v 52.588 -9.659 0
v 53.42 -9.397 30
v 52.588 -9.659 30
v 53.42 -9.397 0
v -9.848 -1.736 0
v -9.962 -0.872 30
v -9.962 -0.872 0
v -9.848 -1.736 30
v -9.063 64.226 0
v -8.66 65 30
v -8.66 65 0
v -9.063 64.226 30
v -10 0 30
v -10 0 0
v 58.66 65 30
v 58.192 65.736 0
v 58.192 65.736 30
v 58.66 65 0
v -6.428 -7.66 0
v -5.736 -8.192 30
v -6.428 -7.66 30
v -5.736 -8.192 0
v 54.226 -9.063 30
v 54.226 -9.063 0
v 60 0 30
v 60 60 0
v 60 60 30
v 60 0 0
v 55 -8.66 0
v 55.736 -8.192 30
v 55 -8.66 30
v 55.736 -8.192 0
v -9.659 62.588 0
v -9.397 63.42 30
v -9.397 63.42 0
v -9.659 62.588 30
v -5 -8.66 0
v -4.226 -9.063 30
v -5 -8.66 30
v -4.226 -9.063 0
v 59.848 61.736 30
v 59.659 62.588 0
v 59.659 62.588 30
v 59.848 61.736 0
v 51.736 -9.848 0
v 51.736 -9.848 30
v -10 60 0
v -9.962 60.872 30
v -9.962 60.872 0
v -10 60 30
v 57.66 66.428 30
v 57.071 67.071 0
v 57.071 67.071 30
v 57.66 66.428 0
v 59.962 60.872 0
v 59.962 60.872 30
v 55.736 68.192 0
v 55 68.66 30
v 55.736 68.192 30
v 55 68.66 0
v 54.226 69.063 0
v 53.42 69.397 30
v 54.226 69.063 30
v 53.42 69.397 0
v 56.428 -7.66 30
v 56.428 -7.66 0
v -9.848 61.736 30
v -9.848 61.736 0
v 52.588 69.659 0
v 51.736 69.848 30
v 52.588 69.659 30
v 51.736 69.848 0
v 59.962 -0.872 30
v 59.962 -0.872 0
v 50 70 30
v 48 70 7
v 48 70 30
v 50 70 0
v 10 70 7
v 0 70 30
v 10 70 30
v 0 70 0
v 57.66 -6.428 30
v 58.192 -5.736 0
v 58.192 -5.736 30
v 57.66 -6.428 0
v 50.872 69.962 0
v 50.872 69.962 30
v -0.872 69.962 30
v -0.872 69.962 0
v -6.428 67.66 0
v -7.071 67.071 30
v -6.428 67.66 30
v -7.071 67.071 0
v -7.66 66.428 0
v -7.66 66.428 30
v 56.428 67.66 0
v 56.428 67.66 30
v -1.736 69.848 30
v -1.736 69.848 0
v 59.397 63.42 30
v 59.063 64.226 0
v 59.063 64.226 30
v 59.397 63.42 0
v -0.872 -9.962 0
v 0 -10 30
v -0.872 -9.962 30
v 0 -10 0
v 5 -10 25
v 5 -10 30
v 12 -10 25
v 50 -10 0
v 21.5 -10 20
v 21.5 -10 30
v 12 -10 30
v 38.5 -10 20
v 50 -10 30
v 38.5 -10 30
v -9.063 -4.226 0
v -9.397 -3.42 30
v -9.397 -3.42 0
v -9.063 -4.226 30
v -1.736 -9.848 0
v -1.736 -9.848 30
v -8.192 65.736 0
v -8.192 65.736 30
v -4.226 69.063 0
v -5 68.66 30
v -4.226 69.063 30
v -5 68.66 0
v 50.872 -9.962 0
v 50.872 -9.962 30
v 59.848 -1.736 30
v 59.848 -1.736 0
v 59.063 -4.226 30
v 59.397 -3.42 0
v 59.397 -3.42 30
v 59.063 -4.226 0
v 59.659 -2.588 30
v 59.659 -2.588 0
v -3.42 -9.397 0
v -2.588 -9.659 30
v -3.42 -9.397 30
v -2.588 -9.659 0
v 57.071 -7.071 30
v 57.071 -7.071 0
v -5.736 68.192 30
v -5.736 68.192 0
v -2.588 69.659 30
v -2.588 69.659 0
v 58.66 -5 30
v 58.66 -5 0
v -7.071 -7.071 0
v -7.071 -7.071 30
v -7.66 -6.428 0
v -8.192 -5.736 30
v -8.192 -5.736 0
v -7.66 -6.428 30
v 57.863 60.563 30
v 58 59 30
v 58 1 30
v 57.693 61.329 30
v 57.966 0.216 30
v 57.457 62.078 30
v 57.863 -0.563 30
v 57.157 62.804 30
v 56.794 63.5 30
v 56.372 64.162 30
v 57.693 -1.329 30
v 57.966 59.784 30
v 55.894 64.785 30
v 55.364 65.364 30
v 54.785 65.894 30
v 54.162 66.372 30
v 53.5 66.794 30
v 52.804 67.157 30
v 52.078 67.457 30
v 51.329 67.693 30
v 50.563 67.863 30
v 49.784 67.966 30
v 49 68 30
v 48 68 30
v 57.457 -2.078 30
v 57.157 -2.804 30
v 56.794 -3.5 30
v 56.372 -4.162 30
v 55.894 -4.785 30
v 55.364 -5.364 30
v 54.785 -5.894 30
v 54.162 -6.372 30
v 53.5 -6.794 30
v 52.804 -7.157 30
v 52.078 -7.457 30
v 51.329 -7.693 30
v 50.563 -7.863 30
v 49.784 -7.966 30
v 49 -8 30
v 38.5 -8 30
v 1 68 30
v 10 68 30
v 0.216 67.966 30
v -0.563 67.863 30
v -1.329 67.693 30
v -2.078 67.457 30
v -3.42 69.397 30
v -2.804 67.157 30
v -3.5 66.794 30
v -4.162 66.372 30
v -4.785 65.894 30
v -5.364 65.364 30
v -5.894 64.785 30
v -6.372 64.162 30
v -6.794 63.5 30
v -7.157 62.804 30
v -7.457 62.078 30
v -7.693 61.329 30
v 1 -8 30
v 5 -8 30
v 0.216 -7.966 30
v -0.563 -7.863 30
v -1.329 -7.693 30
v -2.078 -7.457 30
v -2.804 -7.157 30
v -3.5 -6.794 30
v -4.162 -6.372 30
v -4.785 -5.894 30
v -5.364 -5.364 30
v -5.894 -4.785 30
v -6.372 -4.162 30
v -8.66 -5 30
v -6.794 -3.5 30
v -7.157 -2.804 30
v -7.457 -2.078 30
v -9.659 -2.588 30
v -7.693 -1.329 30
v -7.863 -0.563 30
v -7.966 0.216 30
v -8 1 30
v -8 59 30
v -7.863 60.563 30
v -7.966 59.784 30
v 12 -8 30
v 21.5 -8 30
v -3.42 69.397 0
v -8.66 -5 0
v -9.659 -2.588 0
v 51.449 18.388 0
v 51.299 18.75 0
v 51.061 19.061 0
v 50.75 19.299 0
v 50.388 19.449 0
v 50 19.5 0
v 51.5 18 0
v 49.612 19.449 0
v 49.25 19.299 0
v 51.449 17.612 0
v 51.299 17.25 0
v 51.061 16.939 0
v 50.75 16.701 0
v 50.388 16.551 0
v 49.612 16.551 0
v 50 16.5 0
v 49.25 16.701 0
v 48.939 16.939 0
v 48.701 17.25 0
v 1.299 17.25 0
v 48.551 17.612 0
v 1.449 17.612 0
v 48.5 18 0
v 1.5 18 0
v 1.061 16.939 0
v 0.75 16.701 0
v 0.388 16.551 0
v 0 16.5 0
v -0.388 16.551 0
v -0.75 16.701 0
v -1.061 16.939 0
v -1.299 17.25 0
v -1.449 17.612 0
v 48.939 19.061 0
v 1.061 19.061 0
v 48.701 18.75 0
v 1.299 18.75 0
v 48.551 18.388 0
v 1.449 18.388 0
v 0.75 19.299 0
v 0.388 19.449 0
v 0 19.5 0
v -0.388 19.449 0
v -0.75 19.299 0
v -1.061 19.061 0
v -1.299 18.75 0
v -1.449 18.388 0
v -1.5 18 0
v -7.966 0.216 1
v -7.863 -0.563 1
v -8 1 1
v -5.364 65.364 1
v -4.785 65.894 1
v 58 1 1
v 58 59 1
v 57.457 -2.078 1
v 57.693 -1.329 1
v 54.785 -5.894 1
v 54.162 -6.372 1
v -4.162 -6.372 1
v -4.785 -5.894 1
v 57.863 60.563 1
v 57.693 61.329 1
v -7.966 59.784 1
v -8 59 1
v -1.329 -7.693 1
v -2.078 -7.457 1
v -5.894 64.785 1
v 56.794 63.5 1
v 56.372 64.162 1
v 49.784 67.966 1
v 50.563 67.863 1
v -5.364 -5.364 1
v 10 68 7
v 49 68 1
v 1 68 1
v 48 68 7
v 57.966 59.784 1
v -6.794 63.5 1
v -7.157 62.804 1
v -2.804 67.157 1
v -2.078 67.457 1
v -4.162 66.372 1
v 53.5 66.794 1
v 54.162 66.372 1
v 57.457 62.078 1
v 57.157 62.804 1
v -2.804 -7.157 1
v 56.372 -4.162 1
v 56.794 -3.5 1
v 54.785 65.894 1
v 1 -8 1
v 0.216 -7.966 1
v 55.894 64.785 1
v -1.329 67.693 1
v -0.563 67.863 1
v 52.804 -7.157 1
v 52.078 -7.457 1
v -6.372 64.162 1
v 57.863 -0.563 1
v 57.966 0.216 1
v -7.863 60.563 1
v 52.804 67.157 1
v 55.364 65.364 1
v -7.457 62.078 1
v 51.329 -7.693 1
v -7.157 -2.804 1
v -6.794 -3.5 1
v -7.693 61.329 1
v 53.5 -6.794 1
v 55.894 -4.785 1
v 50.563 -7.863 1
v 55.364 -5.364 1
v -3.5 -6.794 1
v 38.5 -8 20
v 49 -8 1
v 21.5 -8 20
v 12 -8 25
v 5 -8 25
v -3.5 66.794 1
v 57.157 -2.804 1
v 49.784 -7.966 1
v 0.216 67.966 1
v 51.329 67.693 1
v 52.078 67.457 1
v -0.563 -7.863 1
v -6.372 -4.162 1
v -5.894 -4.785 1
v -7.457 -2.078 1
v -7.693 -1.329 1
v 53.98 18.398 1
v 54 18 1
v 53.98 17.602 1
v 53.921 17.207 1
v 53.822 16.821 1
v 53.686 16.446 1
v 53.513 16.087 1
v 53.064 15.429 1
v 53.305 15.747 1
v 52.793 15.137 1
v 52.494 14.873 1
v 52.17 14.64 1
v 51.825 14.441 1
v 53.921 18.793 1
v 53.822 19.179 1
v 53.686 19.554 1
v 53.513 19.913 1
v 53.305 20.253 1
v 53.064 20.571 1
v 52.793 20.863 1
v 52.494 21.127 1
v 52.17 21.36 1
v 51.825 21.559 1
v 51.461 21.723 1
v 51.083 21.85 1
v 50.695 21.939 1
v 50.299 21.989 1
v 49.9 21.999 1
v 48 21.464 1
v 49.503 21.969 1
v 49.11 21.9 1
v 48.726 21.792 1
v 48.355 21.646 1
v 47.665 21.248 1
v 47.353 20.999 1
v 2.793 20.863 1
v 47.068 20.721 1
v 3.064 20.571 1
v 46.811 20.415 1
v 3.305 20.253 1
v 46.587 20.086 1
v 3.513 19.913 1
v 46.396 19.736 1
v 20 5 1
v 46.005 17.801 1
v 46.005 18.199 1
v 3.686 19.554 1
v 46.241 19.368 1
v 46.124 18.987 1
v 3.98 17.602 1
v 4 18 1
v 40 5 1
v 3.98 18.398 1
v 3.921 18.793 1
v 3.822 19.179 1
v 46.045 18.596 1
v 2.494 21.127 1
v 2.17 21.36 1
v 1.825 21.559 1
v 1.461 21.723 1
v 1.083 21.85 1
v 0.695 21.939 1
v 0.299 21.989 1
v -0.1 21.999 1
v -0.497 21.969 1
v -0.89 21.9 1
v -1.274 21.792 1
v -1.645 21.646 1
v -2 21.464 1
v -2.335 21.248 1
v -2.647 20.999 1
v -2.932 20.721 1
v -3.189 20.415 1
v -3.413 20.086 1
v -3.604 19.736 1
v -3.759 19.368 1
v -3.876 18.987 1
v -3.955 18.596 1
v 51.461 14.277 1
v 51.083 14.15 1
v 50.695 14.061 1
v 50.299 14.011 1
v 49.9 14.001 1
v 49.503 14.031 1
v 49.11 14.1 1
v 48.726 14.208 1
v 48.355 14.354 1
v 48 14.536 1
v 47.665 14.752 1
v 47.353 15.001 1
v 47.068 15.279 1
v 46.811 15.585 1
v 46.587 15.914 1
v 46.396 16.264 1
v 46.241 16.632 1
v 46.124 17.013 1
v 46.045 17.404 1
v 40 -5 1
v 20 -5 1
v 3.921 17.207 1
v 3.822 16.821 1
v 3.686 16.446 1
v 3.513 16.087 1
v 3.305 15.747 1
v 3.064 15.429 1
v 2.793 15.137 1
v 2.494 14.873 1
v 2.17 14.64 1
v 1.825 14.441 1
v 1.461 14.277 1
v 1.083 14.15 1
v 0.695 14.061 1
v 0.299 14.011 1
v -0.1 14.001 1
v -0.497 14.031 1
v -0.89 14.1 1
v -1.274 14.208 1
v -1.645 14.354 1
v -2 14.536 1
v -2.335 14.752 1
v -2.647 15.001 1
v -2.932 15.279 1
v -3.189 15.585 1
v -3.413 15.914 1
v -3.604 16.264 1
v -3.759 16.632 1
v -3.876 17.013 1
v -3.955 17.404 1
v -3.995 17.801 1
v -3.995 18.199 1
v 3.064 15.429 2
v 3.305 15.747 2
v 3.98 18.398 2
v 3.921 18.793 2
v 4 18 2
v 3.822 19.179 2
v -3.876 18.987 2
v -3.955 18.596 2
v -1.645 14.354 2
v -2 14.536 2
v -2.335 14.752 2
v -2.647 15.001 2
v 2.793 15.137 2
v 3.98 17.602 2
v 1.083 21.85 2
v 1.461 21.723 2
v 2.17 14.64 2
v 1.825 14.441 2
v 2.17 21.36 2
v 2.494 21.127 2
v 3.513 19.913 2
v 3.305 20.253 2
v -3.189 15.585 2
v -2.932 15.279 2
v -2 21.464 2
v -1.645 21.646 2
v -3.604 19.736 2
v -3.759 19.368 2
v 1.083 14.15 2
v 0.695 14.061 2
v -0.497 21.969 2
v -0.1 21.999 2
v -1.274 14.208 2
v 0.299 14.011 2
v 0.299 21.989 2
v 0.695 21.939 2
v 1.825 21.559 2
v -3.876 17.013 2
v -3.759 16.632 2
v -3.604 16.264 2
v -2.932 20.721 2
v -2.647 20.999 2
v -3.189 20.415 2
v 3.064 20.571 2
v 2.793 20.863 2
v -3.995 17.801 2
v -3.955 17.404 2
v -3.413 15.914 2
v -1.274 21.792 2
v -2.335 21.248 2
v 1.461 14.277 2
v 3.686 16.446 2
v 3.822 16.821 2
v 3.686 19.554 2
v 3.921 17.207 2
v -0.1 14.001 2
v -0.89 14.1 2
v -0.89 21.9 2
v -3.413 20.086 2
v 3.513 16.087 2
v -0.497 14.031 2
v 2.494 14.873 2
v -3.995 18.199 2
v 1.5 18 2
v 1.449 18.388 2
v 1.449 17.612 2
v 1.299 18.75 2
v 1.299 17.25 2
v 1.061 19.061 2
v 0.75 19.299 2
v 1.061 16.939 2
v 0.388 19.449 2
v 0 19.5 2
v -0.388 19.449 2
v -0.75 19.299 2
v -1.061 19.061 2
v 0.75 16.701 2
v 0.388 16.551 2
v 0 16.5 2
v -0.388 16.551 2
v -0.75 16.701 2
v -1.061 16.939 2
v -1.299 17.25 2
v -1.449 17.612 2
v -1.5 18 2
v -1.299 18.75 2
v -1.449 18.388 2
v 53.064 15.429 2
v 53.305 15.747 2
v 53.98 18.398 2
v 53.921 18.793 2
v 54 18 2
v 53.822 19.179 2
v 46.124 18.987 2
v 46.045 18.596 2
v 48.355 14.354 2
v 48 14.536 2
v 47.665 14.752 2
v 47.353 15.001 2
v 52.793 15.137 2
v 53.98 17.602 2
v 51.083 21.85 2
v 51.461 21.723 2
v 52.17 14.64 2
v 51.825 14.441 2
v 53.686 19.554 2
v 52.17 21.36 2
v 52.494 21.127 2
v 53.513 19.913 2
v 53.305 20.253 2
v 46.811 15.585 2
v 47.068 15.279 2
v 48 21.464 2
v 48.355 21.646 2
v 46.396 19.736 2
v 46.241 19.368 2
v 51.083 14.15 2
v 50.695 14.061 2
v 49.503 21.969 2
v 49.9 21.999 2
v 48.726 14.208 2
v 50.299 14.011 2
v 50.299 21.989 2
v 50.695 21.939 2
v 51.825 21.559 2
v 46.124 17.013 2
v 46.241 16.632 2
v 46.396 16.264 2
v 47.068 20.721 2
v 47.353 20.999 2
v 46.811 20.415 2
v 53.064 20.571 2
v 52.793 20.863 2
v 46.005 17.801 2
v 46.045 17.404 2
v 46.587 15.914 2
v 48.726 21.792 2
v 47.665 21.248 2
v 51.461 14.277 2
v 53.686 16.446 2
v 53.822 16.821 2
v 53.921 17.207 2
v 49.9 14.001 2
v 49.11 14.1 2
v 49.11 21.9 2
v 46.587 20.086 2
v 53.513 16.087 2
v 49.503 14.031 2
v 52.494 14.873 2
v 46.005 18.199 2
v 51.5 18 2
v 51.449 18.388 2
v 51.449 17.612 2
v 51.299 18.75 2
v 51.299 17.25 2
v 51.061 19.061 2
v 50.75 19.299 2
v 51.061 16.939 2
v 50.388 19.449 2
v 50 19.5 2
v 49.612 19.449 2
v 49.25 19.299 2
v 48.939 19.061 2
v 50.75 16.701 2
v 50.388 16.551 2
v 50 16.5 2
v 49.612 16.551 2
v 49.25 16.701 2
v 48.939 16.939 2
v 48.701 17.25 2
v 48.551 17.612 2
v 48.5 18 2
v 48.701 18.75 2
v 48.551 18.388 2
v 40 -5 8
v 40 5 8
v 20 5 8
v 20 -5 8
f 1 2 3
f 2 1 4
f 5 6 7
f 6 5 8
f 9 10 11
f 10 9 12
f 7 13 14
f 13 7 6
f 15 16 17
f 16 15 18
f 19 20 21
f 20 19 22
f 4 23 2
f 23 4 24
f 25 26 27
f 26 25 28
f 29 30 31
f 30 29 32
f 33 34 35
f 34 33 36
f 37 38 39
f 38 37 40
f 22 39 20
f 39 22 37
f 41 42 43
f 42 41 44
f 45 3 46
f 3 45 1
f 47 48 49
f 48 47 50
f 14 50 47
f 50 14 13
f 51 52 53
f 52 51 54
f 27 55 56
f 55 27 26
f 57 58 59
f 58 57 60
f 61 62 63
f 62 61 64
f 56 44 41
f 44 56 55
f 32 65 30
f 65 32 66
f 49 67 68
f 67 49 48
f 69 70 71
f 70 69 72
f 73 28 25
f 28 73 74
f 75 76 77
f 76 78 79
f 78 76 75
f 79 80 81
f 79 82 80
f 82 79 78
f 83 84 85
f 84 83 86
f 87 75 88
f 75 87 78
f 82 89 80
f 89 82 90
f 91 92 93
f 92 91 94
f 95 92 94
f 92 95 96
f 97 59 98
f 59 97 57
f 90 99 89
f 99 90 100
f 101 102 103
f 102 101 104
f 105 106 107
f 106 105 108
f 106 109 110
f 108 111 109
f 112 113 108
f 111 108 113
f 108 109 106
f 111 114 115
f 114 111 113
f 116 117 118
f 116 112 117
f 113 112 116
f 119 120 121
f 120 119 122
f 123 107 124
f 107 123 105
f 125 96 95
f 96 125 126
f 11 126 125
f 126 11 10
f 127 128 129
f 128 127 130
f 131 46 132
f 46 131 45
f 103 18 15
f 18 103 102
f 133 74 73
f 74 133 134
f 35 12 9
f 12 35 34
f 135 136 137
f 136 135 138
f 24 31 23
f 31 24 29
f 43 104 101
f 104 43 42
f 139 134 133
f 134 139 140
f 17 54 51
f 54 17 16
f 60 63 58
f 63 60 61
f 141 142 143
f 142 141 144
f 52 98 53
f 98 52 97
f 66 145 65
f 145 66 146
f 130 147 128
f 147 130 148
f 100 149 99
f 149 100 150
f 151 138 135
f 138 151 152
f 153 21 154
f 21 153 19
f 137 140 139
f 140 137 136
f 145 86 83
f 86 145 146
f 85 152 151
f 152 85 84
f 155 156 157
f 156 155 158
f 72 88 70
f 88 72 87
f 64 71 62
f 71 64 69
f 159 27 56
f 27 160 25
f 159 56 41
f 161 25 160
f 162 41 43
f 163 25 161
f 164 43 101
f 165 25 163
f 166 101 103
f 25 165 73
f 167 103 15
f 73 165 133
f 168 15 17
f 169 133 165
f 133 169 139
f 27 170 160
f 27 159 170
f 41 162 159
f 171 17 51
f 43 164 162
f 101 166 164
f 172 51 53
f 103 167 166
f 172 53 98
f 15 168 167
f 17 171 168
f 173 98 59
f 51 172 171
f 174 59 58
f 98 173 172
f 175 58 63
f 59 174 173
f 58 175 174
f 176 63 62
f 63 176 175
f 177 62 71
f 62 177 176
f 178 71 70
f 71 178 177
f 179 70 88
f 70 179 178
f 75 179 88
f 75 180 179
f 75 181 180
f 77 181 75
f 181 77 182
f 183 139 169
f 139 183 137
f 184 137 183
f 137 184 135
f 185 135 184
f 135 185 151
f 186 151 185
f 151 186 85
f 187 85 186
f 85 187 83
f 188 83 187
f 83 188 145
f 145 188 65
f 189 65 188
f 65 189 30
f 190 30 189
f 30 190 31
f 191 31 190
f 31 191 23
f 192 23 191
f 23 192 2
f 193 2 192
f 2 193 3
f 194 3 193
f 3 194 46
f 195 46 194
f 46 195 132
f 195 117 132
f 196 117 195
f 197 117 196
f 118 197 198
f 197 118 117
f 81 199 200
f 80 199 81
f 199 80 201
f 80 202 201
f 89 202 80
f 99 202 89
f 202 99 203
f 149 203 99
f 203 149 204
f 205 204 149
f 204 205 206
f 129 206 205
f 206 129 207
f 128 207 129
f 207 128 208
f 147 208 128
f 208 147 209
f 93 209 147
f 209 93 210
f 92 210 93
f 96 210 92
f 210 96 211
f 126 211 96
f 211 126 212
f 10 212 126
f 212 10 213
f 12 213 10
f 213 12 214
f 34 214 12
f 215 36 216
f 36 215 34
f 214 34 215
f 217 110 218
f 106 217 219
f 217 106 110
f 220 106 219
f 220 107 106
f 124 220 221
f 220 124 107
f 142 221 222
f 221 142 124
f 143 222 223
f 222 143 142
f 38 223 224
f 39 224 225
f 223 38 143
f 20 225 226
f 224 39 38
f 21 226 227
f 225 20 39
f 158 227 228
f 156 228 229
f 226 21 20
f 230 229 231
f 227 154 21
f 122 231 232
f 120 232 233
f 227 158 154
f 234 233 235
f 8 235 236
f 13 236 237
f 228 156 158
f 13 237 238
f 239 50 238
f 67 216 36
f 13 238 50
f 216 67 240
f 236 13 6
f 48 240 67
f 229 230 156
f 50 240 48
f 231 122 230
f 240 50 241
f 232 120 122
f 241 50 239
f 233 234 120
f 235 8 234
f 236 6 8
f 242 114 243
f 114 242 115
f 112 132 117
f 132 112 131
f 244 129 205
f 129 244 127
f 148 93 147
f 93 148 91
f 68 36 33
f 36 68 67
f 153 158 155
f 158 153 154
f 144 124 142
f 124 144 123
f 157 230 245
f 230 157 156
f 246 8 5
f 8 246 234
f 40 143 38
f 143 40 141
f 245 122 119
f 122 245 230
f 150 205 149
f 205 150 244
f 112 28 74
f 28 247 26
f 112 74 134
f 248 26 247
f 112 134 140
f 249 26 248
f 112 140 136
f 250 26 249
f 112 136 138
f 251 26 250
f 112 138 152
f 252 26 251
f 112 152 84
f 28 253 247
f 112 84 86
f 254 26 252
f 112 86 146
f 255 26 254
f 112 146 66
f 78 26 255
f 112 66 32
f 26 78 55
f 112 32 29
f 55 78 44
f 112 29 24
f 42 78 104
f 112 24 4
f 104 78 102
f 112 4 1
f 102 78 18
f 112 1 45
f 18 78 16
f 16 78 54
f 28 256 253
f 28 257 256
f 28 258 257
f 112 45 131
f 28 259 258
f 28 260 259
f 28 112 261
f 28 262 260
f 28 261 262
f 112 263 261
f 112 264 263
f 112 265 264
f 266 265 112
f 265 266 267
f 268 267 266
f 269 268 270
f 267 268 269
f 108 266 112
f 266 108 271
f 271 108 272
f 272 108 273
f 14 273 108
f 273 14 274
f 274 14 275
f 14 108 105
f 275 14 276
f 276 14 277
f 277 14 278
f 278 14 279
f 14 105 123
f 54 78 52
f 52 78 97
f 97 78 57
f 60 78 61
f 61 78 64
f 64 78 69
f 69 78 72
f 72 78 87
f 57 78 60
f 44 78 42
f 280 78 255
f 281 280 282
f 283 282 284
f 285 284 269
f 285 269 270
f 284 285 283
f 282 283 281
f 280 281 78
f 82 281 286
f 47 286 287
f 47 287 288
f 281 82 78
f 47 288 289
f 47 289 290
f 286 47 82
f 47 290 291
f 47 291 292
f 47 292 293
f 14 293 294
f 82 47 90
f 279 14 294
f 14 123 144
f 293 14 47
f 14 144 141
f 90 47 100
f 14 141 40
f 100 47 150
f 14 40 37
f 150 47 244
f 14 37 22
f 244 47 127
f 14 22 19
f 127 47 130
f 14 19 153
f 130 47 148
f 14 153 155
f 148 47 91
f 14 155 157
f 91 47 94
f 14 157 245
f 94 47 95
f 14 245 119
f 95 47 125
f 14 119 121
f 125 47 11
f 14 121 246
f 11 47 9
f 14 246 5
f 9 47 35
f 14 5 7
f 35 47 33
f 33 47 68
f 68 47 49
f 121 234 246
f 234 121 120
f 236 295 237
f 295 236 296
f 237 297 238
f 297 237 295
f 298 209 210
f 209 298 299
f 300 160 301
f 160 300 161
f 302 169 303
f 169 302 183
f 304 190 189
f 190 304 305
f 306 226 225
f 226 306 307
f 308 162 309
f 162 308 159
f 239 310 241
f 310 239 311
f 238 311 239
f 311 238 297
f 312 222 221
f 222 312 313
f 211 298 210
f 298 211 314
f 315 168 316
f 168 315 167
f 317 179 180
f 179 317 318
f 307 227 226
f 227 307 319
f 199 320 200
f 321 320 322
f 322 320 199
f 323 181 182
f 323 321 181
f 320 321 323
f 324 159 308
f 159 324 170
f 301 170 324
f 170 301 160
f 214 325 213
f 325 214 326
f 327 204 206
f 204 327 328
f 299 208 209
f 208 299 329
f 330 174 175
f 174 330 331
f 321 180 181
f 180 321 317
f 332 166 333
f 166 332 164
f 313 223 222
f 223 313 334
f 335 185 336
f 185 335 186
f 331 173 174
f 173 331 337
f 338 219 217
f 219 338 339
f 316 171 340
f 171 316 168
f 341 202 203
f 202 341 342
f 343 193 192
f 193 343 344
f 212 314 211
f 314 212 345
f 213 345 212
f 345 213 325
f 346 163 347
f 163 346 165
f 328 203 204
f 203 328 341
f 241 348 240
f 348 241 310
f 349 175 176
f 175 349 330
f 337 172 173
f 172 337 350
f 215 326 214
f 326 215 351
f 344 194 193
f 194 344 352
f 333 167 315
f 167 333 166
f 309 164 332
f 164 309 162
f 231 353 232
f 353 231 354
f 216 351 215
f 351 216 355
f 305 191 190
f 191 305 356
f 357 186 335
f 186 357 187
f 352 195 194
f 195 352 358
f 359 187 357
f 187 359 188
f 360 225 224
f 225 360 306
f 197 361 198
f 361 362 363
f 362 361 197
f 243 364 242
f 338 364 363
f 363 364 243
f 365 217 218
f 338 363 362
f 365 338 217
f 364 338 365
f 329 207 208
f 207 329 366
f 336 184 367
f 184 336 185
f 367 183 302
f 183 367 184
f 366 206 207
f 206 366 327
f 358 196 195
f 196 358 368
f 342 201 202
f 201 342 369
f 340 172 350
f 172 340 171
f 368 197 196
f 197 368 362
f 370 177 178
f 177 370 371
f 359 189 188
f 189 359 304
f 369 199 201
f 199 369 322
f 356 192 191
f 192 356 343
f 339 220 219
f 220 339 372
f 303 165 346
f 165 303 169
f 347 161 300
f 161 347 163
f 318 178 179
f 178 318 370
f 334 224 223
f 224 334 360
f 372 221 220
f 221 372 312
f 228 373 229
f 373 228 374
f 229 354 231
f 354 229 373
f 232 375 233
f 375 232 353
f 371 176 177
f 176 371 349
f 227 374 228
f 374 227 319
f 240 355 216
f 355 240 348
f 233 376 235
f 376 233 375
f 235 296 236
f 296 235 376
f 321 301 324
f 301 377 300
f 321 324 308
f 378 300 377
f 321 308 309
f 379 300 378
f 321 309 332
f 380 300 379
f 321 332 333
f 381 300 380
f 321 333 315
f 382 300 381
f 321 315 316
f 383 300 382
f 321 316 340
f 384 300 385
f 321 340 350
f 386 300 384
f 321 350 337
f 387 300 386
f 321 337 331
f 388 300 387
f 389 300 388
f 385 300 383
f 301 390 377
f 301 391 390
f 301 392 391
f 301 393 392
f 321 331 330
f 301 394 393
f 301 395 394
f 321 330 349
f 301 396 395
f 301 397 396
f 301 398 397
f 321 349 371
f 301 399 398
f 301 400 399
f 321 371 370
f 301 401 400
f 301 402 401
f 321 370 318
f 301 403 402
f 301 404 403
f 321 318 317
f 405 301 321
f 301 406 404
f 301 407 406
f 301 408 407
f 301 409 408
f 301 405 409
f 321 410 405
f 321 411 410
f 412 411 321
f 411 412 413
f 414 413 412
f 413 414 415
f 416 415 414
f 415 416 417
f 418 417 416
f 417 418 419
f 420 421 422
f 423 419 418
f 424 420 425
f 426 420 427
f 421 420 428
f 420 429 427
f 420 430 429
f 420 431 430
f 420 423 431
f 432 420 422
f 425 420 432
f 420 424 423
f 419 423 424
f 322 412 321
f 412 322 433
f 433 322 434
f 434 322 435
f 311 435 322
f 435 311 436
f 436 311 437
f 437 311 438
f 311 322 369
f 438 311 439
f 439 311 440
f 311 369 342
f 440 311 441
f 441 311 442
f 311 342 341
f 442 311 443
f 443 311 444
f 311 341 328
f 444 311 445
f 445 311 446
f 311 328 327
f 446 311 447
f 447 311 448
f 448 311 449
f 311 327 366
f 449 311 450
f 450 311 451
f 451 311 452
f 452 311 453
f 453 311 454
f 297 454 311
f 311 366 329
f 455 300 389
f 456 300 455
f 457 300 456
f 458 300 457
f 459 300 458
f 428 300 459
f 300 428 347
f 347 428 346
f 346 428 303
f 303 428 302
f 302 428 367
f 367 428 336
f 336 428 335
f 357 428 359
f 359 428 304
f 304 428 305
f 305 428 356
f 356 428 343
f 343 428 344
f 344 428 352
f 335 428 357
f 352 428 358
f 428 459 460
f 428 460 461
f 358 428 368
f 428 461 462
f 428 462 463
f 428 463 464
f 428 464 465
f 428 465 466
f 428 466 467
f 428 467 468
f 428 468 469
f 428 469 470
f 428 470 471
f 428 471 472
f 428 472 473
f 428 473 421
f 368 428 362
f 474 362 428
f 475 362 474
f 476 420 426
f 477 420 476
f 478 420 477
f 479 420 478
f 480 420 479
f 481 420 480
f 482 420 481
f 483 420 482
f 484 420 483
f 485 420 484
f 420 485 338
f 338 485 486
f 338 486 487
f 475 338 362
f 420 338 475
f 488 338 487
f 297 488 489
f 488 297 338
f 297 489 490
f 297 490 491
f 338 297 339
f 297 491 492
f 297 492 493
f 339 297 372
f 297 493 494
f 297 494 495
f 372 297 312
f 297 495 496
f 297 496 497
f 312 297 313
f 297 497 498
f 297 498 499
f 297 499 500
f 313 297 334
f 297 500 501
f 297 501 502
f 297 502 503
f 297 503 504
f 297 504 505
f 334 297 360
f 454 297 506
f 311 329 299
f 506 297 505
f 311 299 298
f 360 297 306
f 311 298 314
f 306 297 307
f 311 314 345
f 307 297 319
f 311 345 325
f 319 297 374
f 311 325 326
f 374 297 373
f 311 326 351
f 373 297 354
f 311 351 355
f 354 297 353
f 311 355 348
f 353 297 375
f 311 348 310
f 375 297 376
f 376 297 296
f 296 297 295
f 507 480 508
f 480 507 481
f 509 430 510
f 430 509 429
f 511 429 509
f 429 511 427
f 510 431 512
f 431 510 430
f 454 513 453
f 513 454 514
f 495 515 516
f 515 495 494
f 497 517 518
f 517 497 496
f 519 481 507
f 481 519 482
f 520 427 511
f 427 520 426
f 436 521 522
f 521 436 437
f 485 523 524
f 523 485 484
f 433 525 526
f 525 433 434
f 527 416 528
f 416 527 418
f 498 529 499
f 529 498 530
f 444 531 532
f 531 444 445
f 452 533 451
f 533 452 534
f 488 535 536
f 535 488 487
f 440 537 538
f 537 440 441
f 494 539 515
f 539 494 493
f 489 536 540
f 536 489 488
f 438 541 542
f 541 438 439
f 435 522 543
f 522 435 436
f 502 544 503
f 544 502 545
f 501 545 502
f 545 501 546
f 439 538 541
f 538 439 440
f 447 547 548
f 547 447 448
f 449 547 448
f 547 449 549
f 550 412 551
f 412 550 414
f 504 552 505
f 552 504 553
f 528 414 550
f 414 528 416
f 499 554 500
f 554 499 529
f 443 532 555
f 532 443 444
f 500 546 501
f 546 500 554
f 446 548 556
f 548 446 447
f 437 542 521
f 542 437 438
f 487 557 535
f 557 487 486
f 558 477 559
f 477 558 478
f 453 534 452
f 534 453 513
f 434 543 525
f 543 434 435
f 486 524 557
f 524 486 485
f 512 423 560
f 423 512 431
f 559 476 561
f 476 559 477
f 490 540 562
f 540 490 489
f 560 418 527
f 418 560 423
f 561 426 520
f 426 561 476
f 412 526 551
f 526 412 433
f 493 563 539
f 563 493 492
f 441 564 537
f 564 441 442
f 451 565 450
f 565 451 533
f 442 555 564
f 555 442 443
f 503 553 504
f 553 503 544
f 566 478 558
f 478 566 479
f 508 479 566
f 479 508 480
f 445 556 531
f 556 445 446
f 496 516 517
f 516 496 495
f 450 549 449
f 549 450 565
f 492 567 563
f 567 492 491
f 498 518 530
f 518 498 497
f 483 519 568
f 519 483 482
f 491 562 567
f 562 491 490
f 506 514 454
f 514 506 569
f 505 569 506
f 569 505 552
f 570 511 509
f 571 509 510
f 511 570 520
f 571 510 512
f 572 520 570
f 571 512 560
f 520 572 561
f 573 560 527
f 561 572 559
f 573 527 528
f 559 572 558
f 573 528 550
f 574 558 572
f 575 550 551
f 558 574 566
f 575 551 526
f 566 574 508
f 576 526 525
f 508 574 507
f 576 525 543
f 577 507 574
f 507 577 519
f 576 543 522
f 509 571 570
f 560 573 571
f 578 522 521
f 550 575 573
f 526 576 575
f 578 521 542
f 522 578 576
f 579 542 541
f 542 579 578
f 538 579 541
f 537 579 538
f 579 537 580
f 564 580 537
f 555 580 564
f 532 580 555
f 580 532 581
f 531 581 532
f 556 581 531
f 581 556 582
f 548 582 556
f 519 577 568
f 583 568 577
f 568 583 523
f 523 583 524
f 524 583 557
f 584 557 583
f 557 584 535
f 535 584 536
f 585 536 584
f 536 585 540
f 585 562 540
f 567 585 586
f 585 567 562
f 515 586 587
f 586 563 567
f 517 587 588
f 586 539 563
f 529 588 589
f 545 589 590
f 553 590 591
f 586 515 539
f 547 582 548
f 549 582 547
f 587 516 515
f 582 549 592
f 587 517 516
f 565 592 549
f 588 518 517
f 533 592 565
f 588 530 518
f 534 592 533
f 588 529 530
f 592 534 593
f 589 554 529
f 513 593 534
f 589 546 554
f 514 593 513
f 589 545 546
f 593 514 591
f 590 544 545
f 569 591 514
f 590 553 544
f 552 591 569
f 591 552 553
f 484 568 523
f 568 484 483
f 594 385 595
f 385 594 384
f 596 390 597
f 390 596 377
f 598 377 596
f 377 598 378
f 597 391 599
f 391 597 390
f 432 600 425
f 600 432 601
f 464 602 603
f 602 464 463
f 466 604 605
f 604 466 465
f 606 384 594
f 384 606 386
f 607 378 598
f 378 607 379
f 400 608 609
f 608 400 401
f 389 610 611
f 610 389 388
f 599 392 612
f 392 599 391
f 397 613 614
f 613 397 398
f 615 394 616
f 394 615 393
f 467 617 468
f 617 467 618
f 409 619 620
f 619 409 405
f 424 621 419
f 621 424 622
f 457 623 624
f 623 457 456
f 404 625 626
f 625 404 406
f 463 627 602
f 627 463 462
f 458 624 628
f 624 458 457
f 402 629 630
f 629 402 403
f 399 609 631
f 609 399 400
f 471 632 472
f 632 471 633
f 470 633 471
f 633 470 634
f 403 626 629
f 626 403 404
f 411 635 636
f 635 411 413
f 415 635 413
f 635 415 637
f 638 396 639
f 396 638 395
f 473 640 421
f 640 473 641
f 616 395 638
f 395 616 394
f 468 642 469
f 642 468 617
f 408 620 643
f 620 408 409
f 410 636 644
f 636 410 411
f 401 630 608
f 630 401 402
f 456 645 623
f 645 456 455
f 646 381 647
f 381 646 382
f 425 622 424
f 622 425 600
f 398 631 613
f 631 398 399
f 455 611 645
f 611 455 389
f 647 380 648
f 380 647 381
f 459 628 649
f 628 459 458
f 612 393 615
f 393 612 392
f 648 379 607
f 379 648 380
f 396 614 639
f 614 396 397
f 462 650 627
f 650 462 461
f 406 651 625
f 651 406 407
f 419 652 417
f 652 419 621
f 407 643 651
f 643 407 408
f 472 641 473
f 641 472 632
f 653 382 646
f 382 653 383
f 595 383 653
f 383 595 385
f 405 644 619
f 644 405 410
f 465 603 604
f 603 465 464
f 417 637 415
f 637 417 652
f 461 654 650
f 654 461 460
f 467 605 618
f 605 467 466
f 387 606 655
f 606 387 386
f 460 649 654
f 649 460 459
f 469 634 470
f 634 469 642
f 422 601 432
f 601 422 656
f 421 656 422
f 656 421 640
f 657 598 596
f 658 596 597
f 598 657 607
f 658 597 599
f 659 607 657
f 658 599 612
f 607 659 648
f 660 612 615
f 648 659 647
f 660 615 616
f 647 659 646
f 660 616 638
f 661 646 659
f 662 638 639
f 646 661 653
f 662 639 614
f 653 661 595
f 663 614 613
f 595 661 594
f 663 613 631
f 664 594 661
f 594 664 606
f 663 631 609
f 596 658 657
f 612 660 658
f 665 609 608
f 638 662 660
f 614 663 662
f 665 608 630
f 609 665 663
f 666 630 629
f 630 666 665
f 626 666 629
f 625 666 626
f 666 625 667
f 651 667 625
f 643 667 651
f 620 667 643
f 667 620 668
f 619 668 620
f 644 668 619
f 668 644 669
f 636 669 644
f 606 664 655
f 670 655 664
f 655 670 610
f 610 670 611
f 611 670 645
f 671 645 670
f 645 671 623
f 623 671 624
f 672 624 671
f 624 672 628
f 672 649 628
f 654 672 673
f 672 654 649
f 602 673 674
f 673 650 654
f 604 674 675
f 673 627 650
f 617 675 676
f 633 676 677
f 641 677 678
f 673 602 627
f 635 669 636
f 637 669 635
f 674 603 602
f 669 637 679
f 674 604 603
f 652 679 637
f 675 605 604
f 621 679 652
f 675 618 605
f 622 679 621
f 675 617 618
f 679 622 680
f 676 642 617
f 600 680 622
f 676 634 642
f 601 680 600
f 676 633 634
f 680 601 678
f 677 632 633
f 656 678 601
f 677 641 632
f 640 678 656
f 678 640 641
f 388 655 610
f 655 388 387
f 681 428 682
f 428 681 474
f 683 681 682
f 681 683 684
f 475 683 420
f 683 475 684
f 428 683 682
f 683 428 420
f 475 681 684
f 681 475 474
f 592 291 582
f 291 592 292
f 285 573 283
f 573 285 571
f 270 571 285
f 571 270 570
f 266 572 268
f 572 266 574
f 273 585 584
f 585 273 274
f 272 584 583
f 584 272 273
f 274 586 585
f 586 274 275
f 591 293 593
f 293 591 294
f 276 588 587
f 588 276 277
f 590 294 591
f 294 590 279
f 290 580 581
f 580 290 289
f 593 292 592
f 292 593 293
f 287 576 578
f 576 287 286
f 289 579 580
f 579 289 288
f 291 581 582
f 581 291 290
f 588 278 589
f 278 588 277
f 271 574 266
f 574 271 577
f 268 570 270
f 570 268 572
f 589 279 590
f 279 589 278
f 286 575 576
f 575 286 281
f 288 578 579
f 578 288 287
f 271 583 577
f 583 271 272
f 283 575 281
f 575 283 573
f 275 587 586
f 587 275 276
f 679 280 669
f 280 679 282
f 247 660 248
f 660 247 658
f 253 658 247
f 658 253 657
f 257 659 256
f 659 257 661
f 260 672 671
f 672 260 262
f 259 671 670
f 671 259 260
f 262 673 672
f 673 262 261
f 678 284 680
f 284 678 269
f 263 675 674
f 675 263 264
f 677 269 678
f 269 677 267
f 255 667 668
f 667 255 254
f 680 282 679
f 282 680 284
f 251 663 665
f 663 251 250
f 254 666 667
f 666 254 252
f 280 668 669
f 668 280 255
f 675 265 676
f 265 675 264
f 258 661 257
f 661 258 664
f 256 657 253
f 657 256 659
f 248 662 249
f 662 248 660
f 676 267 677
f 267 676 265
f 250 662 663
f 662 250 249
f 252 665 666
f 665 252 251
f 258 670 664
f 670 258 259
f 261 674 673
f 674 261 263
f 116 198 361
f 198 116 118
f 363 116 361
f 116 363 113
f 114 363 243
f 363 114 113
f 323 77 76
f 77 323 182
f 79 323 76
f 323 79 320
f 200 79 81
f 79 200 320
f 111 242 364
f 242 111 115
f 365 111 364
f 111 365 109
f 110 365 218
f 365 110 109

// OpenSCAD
//$fn=60;
$fa=5;
$fs=.4;

difference(){
    union(){
        base_box();
        translate([0,18,0]) cylinder(d=8,h=2);
        translate([50,18,0]) cylinder(d=8,h=2);
        translate([20,-5,0]) cube([20,10,8]);
    }
    translate([0,18,0]) cylinder(d=3,h=5);
    translate([50,18,0]) cylinder(d=3,h=5);
    translate([21.5,-15,20]) cube([17,20,15]);
    translate([10,60,7]) cube([38,20,25]);
    translate([5,-15,25]) cube([7,20,15]);
}

module base_box(){
    difference(){
        linear_extrude(height=30) hull(){
                circle(r=10);
                translate([50,0,0]) circle(r=10);
                translate([0,60,0]) circle(r=10);
                translate([50,60,0]) circle(r=10);
        }
        translate([1,1,1]) linear_extrude(height=40) 
            hull(){
                circle(r=9);
                translate([48,0,0]) circle(r=9);
                translate([0,58,0]) circle(r=9);
                translate([48,58,0]) circle(r=9);
            }
    }
}
